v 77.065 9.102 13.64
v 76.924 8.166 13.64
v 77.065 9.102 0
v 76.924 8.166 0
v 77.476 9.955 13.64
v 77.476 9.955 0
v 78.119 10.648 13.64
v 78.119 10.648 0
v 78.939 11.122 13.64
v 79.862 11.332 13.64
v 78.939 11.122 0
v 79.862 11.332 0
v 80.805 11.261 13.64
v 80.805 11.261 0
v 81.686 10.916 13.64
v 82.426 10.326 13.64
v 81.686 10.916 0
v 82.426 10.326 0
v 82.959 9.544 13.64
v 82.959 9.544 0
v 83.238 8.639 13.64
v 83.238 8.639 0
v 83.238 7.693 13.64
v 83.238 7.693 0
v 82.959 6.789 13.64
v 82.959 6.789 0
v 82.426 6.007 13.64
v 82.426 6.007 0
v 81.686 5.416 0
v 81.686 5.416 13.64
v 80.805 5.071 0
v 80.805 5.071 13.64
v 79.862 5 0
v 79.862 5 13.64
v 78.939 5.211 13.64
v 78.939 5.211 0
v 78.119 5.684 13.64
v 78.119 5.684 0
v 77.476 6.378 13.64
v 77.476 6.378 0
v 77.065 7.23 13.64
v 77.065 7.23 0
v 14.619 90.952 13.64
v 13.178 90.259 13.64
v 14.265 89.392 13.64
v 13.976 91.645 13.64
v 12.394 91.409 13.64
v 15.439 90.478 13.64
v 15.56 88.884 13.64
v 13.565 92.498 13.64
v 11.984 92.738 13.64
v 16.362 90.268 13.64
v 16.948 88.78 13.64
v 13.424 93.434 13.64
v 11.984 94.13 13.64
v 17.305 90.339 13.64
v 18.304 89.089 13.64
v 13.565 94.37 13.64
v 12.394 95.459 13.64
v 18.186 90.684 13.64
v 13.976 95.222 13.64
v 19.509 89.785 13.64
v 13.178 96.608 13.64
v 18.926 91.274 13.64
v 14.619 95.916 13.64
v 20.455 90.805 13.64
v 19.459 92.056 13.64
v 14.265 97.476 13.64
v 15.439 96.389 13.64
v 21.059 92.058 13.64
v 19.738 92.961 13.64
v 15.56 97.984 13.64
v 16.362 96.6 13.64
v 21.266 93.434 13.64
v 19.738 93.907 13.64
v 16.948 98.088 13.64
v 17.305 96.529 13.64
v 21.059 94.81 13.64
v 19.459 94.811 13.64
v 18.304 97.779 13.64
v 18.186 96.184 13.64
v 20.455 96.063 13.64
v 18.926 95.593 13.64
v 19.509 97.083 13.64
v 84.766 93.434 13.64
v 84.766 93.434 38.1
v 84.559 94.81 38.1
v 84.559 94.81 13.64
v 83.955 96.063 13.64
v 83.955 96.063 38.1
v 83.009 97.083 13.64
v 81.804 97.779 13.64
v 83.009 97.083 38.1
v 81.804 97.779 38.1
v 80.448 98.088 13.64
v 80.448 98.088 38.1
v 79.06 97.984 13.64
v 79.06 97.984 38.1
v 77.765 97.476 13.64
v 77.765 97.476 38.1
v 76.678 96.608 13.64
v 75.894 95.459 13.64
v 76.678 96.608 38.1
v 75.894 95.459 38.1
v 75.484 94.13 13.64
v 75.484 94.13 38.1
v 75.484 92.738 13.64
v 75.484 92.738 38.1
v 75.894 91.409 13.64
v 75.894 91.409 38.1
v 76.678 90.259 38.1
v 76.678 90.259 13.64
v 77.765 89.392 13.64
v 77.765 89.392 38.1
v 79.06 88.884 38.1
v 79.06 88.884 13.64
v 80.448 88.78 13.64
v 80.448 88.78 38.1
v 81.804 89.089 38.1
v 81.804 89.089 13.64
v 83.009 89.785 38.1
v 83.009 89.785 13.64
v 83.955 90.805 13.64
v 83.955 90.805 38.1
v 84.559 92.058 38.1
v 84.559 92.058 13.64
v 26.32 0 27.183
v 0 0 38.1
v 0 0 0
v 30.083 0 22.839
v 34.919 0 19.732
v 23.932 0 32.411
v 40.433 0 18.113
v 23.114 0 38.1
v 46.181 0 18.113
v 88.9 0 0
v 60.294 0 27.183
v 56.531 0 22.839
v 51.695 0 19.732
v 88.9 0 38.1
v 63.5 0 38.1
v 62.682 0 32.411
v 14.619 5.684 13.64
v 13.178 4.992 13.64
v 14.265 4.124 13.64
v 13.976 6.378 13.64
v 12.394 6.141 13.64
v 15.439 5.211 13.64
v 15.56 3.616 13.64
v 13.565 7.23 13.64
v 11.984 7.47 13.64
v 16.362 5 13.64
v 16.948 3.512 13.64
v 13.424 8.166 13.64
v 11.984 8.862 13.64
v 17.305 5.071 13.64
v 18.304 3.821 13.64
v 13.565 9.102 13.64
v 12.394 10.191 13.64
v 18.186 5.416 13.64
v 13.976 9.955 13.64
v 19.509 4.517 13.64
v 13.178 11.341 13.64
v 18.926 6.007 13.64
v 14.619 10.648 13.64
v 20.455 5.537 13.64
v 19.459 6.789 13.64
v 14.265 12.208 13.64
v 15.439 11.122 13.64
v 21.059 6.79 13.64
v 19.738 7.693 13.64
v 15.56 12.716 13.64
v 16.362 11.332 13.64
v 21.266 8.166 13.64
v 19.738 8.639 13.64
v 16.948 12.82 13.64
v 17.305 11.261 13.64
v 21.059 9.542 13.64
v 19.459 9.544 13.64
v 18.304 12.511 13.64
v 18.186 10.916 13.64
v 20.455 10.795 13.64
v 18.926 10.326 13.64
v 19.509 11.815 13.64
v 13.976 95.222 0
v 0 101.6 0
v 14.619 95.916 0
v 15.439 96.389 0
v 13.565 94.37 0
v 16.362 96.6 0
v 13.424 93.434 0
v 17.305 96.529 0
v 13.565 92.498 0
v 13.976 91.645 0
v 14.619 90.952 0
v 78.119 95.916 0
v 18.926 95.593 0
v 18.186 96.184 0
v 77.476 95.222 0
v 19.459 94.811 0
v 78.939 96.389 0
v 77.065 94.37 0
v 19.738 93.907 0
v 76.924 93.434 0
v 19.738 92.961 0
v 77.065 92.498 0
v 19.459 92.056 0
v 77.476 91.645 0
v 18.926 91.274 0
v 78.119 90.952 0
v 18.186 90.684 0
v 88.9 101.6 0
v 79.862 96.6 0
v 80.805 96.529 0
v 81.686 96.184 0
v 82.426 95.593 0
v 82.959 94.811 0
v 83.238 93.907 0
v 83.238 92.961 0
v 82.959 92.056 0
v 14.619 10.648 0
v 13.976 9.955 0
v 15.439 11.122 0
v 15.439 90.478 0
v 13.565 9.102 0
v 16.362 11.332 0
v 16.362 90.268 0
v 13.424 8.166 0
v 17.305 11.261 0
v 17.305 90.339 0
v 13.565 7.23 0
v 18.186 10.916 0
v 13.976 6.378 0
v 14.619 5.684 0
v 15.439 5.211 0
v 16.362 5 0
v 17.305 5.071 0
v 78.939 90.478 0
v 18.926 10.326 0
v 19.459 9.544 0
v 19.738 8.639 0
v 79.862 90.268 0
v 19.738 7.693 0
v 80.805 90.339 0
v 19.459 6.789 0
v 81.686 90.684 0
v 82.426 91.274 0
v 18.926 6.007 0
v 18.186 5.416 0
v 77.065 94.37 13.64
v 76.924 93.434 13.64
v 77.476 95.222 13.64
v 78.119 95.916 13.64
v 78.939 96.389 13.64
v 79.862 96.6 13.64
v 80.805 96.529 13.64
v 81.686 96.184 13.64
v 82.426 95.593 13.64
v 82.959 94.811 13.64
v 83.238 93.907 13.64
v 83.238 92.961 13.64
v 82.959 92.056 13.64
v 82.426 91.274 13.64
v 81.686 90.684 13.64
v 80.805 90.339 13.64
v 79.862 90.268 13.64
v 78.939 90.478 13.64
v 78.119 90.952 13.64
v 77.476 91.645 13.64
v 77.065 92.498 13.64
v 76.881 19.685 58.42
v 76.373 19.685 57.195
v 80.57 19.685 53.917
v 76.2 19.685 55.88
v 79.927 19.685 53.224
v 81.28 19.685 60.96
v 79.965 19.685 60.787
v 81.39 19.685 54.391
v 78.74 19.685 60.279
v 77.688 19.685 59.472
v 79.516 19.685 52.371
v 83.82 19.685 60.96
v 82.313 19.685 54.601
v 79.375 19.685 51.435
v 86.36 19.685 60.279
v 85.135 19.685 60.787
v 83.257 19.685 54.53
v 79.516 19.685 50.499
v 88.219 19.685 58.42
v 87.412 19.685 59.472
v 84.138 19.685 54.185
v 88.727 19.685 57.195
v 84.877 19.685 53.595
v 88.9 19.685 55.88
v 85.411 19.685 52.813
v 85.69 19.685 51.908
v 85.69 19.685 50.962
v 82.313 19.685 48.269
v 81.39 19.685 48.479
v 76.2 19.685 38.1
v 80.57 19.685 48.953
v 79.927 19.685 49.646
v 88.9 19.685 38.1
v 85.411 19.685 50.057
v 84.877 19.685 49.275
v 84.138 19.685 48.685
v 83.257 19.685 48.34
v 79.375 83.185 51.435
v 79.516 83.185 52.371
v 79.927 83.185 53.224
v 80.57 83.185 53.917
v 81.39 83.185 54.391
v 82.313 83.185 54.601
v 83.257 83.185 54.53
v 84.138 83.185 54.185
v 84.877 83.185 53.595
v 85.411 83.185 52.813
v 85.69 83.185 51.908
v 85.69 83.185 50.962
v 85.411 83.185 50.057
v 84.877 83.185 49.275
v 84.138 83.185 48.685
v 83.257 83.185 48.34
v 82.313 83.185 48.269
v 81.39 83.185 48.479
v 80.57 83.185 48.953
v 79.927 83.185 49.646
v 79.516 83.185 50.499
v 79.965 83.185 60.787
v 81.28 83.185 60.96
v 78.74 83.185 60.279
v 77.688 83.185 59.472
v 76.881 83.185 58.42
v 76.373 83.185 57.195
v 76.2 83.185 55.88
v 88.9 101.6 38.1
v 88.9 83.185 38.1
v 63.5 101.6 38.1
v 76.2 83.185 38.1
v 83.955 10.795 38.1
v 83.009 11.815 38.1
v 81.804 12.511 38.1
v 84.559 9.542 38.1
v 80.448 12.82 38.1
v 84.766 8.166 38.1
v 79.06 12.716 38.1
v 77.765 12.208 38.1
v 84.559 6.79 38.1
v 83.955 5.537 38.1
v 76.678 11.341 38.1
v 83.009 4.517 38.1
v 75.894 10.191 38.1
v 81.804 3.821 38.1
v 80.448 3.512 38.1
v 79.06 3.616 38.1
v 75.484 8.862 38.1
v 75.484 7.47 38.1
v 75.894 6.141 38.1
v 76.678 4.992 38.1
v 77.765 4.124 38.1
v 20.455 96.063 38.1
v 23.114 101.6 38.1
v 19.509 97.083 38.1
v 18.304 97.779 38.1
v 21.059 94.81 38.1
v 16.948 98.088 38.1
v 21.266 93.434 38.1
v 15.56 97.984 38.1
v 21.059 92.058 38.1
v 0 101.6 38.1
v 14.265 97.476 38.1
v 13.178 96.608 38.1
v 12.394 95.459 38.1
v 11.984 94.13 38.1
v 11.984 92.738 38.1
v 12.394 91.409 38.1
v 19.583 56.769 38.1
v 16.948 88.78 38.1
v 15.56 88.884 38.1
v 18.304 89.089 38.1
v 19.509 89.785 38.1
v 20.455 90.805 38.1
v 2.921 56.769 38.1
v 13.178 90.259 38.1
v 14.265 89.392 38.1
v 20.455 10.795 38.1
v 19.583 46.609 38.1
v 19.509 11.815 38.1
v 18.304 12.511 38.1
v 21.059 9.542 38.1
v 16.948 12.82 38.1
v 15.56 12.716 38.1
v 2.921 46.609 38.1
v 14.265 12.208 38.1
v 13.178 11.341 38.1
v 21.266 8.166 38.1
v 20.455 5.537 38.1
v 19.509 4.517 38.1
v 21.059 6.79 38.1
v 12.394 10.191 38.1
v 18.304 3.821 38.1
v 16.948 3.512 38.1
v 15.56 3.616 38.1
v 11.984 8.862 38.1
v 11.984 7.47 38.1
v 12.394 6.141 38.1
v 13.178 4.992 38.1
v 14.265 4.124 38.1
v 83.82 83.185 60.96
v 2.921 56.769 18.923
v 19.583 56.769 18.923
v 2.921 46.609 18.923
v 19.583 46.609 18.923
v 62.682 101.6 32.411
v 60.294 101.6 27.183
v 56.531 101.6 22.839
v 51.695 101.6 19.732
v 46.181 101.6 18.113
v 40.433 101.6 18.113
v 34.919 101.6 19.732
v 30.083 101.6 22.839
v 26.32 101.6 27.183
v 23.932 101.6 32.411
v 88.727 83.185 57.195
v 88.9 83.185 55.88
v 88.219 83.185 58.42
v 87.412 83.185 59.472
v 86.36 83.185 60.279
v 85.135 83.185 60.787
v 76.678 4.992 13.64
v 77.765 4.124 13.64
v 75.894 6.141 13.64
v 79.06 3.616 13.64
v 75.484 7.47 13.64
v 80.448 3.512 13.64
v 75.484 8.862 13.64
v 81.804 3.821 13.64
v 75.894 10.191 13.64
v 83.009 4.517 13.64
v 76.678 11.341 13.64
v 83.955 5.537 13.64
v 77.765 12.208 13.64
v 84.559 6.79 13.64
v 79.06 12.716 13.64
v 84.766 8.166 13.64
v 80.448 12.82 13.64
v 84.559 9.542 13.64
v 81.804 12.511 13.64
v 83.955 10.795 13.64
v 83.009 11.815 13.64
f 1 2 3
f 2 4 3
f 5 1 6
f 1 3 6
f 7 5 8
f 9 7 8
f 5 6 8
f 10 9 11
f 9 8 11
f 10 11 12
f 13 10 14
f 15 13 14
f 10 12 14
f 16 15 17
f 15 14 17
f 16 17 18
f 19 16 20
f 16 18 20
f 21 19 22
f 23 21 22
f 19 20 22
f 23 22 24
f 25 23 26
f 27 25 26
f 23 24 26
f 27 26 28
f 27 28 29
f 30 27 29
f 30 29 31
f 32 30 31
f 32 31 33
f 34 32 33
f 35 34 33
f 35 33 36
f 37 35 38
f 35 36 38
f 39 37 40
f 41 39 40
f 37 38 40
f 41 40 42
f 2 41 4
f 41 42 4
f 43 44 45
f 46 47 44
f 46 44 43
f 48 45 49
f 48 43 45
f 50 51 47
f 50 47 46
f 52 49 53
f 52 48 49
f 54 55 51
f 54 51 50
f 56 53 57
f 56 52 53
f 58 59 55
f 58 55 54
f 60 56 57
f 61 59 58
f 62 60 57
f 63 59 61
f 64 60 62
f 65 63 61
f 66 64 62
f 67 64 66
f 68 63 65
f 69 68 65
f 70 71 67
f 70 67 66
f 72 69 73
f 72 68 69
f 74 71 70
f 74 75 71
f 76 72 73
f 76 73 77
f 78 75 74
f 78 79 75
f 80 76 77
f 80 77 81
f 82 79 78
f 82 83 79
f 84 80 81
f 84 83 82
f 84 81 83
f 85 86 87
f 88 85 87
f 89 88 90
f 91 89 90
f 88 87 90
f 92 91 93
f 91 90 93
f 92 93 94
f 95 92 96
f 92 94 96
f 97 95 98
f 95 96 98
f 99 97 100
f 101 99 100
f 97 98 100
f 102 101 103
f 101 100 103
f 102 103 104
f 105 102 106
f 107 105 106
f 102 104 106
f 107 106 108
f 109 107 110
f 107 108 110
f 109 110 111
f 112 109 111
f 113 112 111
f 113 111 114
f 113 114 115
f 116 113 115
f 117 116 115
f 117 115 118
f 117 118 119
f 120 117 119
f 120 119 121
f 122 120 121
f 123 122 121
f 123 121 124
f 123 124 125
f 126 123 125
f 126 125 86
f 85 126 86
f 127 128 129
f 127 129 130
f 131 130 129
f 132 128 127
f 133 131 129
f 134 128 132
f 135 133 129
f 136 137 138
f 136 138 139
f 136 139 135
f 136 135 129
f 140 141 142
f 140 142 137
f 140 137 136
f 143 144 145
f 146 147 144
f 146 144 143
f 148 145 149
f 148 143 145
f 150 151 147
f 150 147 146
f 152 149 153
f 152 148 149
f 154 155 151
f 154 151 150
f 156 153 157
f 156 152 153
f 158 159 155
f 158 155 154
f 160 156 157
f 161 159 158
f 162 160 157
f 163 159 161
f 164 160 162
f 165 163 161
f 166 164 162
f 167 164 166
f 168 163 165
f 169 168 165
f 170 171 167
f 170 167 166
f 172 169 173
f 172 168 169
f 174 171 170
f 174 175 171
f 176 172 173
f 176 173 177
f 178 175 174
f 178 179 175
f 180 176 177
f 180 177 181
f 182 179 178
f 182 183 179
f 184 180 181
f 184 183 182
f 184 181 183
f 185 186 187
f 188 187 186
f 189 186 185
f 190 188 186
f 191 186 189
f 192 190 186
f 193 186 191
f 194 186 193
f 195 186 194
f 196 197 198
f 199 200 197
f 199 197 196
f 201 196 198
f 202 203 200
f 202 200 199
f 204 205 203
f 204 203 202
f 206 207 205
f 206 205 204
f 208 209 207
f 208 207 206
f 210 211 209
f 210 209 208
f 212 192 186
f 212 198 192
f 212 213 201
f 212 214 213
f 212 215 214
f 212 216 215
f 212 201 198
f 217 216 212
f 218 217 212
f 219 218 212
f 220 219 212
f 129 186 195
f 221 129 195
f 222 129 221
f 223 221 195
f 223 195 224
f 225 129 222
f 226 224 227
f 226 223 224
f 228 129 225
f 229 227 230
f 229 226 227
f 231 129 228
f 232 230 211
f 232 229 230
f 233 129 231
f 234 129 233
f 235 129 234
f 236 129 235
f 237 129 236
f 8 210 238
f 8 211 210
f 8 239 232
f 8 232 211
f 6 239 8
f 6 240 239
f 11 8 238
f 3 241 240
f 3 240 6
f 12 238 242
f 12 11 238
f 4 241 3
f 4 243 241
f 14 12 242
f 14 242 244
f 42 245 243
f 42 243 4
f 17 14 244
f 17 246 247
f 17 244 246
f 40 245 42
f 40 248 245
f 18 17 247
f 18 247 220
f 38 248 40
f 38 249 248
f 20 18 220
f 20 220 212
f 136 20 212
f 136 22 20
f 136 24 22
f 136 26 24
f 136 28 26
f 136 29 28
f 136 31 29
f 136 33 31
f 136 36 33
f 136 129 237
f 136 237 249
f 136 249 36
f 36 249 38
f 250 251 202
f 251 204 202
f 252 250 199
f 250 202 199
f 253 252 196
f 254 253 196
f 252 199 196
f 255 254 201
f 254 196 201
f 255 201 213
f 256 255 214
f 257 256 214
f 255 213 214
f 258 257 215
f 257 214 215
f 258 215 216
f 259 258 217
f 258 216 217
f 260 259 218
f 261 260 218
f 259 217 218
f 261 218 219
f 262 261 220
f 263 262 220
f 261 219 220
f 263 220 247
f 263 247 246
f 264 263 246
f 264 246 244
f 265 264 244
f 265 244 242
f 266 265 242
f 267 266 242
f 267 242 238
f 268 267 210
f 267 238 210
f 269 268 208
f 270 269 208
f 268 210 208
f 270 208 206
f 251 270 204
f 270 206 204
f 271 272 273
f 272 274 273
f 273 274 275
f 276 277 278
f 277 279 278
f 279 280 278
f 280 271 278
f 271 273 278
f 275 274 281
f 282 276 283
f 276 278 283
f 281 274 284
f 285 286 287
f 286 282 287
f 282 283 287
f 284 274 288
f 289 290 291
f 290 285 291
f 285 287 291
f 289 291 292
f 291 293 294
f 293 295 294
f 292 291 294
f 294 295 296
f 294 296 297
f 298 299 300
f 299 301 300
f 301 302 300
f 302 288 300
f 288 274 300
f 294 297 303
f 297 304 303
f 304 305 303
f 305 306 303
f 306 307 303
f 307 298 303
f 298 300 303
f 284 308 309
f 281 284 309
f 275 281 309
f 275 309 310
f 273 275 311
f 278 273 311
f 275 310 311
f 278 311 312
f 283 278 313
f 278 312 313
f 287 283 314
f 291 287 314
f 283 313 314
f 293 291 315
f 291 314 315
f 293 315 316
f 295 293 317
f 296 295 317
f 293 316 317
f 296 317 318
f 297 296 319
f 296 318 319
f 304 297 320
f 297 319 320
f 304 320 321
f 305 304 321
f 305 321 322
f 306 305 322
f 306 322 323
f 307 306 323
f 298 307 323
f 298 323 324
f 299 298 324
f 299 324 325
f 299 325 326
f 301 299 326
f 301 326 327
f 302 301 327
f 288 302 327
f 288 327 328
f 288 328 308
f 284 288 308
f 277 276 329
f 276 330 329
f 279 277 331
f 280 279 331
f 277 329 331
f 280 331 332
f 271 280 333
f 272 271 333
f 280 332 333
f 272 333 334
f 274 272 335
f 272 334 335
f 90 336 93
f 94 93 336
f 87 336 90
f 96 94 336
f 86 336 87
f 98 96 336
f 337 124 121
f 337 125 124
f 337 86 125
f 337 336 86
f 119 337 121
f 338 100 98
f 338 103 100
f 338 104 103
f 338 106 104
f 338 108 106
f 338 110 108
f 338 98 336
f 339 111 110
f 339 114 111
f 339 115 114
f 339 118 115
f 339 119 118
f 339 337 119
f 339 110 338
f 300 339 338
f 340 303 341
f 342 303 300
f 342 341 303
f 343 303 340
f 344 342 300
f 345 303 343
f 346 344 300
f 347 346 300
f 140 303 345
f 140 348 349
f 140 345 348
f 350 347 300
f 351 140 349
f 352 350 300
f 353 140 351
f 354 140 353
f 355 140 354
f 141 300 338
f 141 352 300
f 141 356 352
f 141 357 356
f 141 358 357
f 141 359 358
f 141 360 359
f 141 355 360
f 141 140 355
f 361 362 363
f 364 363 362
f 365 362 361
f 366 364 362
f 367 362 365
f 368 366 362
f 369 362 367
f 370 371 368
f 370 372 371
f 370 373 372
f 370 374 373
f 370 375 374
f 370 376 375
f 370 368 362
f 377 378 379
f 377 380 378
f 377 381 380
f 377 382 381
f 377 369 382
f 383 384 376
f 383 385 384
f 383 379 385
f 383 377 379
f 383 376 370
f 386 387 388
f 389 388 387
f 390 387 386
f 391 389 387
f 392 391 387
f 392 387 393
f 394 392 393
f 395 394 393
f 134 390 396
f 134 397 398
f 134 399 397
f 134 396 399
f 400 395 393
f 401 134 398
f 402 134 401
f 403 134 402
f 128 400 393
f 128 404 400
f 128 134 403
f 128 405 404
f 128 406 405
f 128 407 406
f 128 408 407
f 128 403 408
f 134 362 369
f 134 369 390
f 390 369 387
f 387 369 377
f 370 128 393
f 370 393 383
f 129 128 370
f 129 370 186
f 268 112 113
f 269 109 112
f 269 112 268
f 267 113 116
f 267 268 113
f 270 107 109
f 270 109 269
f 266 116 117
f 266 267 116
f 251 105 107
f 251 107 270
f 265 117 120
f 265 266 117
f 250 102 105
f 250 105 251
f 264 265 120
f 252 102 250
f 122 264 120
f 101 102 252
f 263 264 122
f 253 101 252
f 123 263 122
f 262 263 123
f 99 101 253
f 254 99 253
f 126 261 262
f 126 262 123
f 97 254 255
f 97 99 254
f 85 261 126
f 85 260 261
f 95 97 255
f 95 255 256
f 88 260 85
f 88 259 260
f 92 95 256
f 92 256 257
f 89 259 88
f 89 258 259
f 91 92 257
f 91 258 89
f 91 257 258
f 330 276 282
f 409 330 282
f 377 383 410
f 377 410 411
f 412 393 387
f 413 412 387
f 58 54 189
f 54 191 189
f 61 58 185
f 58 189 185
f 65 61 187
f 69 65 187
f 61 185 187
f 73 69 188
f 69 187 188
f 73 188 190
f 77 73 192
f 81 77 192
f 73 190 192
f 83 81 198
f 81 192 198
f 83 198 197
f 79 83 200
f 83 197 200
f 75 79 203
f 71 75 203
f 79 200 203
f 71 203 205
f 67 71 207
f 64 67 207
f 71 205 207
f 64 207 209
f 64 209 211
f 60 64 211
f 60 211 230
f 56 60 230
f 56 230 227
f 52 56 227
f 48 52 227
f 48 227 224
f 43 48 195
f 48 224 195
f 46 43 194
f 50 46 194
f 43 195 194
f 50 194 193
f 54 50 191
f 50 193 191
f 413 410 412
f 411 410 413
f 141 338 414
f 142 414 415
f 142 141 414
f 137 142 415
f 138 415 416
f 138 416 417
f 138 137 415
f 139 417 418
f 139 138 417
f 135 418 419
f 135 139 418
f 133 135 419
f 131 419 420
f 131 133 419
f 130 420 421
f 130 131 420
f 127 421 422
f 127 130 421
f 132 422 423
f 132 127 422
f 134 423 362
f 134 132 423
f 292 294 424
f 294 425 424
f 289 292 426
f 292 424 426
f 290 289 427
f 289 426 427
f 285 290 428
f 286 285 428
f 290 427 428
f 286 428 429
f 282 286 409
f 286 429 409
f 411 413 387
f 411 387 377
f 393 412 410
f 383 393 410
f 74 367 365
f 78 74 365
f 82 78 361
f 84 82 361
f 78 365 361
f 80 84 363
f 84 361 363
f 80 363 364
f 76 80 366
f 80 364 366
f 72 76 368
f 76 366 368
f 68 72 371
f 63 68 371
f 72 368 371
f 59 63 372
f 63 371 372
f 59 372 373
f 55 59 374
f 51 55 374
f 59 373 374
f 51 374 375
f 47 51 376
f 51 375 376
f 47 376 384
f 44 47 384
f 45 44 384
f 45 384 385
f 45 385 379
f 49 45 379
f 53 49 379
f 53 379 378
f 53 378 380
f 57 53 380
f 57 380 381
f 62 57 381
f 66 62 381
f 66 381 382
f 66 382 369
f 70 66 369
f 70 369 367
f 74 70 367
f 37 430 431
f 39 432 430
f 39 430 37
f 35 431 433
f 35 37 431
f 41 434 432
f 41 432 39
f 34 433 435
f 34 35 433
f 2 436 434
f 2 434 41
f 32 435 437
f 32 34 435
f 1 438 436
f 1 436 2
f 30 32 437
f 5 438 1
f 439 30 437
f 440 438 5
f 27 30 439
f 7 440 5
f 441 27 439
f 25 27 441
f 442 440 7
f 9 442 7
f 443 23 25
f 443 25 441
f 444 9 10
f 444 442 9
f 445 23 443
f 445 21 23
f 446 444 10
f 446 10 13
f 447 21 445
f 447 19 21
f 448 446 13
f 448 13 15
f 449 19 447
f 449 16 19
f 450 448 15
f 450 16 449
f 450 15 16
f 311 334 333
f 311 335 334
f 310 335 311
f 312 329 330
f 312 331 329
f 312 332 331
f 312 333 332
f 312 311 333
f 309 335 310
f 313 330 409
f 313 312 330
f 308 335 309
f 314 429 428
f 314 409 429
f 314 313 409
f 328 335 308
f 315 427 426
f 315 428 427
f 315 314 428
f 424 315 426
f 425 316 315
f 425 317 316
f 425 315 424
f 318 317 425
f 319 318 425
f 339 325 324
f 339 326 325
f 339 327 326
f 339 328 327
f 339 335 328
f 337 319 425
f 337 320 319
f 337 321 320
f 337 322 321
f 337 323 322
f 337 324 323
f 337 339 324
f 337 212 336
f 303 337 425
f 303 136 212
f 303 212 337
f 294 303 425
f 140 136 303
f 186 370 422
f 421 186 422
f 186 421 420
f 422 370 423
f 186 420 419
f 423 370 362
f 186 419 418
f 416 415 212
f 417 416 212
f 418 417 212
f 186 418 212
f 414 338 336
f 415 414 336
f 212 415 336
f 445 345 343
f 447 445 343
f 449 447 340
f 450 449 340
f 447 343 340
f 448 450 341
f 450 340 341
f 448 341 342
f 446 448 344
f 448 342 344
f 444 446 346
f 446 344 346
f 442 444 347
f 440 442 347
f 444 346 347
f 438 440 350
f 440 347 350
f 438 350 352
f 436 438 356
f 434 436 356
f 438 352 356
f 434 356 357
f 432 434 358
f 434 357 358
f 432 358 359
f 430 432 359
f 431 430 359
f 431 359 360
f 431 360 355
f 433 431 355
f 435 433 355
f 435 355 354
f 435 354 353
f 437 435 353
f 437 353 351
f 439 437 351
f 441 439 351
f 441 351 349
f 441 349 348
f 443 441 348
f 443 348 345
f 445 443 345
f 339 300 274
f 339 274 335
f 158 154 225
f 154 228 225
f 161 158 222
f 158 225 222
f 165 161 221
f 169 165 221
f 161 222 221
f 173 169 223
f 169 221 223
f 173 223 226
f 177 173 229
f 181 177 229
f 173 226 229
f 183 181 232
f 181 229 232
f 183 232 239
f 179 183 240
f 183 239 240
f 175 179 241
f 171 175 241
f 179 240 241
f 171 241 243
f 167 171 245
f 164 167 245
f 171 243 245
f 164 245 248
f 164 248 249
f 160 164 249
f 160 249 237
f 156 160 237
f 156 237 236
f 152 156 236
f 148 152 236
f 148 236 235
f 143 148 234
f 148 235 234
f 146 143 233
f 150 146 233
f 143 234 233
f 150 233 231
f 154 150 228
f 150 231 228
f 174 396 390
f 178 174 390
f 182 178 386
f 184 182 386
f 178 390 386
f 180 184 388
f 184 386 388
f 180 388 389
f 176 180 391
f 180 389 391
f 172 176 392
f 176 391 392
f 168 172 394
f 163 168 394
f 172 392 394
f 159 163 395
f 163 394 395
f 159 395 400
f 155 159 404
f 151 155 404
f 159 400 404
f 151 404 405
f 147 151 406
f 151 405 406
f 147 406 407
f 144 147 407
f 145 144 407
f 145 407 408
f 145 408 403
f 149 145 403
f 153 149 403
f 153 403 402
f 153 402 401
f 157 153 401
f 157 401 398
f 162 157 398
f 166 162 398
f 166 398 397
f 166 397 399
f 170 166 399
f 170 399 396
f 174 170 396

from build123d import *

# Parameters (mm, degrees)
F1_DEPTH       = 101.6
F3_D           = 6.35
F3_CBORE_D     = 9.3345
F3_CBORE_DEPTH = 24.4602
F4_W           = 12.7
F4_H           = 63.5
F5_DEPTH       = 22.86
F7_D           = 6.35
F8_R           = 5.08
F9_W           = 16.6624
F9_H           = 10.16
F10_DEPTH      = 19.177


with BuildPart() as f1:
    # F0 (on Front) → F1 (new body)
    with BuildSketch(Plane.XZ):
        with BuildLine():
            Line((0, 38.1), (0, 0))
            Line((0, 0), (88.9, 0))
            Line((88.9, 0), (88.9, 38.1))
            Line((88.9, 38.1), (63.5, 38.1))
            ThreePointArc((63.5, 38.1), (43.307, 17.907), (23.114, 38.1))
            Line((23.114, 38.1), (0, 38.1))
        make_face()
    extrude(amount=-F1_DEPTH)

    # F3 (through all)
    with Locations(Plane.XY.offset(38.1)):
        with Locations((16.5989, 8.1661), (16.5989, 93.4339), (80.0989, 93.4339), (80.0989, 8.1661)):
            CounterBoreHole(F3_D / 2, F3_CBORE_D / 2, F3_CBORE_DEPTH)

    # F4 (on face) → F5 (join)
    with BuildSketch(Plane.XY.offset(38.1)):
        with Locations((82.55, 51.435)):
            Rectangle(F4_W, F4_H)
    extrude(amount=F5_DEPTH)

    # F7 (through all)
    with Locations(Plane.XZ.offset(-19.685)):
        with Locations((82.55, 51.435)):
            Hole(F7_D / 2)

    # F8
    f8_edges = [f1.edges().sort_by_distance(p)[0] for p in [
        (76.2, 51.435, 60.96),
        (88.9, 51.435, 60.96),
    ]]
    fillet(f8_edges, radius=F8_R)

    # F9 (on face) → F10 (cut)
    with BuildSketch(Plane.XY.offset(38.1)):
        with Locations((11.2522, 51.689)):
            Rectangle(F9_W, F9_H)
    extrude(amount=-F10_DEPTH, mode=Mode.SUBTRACT)


solid = f1.part
